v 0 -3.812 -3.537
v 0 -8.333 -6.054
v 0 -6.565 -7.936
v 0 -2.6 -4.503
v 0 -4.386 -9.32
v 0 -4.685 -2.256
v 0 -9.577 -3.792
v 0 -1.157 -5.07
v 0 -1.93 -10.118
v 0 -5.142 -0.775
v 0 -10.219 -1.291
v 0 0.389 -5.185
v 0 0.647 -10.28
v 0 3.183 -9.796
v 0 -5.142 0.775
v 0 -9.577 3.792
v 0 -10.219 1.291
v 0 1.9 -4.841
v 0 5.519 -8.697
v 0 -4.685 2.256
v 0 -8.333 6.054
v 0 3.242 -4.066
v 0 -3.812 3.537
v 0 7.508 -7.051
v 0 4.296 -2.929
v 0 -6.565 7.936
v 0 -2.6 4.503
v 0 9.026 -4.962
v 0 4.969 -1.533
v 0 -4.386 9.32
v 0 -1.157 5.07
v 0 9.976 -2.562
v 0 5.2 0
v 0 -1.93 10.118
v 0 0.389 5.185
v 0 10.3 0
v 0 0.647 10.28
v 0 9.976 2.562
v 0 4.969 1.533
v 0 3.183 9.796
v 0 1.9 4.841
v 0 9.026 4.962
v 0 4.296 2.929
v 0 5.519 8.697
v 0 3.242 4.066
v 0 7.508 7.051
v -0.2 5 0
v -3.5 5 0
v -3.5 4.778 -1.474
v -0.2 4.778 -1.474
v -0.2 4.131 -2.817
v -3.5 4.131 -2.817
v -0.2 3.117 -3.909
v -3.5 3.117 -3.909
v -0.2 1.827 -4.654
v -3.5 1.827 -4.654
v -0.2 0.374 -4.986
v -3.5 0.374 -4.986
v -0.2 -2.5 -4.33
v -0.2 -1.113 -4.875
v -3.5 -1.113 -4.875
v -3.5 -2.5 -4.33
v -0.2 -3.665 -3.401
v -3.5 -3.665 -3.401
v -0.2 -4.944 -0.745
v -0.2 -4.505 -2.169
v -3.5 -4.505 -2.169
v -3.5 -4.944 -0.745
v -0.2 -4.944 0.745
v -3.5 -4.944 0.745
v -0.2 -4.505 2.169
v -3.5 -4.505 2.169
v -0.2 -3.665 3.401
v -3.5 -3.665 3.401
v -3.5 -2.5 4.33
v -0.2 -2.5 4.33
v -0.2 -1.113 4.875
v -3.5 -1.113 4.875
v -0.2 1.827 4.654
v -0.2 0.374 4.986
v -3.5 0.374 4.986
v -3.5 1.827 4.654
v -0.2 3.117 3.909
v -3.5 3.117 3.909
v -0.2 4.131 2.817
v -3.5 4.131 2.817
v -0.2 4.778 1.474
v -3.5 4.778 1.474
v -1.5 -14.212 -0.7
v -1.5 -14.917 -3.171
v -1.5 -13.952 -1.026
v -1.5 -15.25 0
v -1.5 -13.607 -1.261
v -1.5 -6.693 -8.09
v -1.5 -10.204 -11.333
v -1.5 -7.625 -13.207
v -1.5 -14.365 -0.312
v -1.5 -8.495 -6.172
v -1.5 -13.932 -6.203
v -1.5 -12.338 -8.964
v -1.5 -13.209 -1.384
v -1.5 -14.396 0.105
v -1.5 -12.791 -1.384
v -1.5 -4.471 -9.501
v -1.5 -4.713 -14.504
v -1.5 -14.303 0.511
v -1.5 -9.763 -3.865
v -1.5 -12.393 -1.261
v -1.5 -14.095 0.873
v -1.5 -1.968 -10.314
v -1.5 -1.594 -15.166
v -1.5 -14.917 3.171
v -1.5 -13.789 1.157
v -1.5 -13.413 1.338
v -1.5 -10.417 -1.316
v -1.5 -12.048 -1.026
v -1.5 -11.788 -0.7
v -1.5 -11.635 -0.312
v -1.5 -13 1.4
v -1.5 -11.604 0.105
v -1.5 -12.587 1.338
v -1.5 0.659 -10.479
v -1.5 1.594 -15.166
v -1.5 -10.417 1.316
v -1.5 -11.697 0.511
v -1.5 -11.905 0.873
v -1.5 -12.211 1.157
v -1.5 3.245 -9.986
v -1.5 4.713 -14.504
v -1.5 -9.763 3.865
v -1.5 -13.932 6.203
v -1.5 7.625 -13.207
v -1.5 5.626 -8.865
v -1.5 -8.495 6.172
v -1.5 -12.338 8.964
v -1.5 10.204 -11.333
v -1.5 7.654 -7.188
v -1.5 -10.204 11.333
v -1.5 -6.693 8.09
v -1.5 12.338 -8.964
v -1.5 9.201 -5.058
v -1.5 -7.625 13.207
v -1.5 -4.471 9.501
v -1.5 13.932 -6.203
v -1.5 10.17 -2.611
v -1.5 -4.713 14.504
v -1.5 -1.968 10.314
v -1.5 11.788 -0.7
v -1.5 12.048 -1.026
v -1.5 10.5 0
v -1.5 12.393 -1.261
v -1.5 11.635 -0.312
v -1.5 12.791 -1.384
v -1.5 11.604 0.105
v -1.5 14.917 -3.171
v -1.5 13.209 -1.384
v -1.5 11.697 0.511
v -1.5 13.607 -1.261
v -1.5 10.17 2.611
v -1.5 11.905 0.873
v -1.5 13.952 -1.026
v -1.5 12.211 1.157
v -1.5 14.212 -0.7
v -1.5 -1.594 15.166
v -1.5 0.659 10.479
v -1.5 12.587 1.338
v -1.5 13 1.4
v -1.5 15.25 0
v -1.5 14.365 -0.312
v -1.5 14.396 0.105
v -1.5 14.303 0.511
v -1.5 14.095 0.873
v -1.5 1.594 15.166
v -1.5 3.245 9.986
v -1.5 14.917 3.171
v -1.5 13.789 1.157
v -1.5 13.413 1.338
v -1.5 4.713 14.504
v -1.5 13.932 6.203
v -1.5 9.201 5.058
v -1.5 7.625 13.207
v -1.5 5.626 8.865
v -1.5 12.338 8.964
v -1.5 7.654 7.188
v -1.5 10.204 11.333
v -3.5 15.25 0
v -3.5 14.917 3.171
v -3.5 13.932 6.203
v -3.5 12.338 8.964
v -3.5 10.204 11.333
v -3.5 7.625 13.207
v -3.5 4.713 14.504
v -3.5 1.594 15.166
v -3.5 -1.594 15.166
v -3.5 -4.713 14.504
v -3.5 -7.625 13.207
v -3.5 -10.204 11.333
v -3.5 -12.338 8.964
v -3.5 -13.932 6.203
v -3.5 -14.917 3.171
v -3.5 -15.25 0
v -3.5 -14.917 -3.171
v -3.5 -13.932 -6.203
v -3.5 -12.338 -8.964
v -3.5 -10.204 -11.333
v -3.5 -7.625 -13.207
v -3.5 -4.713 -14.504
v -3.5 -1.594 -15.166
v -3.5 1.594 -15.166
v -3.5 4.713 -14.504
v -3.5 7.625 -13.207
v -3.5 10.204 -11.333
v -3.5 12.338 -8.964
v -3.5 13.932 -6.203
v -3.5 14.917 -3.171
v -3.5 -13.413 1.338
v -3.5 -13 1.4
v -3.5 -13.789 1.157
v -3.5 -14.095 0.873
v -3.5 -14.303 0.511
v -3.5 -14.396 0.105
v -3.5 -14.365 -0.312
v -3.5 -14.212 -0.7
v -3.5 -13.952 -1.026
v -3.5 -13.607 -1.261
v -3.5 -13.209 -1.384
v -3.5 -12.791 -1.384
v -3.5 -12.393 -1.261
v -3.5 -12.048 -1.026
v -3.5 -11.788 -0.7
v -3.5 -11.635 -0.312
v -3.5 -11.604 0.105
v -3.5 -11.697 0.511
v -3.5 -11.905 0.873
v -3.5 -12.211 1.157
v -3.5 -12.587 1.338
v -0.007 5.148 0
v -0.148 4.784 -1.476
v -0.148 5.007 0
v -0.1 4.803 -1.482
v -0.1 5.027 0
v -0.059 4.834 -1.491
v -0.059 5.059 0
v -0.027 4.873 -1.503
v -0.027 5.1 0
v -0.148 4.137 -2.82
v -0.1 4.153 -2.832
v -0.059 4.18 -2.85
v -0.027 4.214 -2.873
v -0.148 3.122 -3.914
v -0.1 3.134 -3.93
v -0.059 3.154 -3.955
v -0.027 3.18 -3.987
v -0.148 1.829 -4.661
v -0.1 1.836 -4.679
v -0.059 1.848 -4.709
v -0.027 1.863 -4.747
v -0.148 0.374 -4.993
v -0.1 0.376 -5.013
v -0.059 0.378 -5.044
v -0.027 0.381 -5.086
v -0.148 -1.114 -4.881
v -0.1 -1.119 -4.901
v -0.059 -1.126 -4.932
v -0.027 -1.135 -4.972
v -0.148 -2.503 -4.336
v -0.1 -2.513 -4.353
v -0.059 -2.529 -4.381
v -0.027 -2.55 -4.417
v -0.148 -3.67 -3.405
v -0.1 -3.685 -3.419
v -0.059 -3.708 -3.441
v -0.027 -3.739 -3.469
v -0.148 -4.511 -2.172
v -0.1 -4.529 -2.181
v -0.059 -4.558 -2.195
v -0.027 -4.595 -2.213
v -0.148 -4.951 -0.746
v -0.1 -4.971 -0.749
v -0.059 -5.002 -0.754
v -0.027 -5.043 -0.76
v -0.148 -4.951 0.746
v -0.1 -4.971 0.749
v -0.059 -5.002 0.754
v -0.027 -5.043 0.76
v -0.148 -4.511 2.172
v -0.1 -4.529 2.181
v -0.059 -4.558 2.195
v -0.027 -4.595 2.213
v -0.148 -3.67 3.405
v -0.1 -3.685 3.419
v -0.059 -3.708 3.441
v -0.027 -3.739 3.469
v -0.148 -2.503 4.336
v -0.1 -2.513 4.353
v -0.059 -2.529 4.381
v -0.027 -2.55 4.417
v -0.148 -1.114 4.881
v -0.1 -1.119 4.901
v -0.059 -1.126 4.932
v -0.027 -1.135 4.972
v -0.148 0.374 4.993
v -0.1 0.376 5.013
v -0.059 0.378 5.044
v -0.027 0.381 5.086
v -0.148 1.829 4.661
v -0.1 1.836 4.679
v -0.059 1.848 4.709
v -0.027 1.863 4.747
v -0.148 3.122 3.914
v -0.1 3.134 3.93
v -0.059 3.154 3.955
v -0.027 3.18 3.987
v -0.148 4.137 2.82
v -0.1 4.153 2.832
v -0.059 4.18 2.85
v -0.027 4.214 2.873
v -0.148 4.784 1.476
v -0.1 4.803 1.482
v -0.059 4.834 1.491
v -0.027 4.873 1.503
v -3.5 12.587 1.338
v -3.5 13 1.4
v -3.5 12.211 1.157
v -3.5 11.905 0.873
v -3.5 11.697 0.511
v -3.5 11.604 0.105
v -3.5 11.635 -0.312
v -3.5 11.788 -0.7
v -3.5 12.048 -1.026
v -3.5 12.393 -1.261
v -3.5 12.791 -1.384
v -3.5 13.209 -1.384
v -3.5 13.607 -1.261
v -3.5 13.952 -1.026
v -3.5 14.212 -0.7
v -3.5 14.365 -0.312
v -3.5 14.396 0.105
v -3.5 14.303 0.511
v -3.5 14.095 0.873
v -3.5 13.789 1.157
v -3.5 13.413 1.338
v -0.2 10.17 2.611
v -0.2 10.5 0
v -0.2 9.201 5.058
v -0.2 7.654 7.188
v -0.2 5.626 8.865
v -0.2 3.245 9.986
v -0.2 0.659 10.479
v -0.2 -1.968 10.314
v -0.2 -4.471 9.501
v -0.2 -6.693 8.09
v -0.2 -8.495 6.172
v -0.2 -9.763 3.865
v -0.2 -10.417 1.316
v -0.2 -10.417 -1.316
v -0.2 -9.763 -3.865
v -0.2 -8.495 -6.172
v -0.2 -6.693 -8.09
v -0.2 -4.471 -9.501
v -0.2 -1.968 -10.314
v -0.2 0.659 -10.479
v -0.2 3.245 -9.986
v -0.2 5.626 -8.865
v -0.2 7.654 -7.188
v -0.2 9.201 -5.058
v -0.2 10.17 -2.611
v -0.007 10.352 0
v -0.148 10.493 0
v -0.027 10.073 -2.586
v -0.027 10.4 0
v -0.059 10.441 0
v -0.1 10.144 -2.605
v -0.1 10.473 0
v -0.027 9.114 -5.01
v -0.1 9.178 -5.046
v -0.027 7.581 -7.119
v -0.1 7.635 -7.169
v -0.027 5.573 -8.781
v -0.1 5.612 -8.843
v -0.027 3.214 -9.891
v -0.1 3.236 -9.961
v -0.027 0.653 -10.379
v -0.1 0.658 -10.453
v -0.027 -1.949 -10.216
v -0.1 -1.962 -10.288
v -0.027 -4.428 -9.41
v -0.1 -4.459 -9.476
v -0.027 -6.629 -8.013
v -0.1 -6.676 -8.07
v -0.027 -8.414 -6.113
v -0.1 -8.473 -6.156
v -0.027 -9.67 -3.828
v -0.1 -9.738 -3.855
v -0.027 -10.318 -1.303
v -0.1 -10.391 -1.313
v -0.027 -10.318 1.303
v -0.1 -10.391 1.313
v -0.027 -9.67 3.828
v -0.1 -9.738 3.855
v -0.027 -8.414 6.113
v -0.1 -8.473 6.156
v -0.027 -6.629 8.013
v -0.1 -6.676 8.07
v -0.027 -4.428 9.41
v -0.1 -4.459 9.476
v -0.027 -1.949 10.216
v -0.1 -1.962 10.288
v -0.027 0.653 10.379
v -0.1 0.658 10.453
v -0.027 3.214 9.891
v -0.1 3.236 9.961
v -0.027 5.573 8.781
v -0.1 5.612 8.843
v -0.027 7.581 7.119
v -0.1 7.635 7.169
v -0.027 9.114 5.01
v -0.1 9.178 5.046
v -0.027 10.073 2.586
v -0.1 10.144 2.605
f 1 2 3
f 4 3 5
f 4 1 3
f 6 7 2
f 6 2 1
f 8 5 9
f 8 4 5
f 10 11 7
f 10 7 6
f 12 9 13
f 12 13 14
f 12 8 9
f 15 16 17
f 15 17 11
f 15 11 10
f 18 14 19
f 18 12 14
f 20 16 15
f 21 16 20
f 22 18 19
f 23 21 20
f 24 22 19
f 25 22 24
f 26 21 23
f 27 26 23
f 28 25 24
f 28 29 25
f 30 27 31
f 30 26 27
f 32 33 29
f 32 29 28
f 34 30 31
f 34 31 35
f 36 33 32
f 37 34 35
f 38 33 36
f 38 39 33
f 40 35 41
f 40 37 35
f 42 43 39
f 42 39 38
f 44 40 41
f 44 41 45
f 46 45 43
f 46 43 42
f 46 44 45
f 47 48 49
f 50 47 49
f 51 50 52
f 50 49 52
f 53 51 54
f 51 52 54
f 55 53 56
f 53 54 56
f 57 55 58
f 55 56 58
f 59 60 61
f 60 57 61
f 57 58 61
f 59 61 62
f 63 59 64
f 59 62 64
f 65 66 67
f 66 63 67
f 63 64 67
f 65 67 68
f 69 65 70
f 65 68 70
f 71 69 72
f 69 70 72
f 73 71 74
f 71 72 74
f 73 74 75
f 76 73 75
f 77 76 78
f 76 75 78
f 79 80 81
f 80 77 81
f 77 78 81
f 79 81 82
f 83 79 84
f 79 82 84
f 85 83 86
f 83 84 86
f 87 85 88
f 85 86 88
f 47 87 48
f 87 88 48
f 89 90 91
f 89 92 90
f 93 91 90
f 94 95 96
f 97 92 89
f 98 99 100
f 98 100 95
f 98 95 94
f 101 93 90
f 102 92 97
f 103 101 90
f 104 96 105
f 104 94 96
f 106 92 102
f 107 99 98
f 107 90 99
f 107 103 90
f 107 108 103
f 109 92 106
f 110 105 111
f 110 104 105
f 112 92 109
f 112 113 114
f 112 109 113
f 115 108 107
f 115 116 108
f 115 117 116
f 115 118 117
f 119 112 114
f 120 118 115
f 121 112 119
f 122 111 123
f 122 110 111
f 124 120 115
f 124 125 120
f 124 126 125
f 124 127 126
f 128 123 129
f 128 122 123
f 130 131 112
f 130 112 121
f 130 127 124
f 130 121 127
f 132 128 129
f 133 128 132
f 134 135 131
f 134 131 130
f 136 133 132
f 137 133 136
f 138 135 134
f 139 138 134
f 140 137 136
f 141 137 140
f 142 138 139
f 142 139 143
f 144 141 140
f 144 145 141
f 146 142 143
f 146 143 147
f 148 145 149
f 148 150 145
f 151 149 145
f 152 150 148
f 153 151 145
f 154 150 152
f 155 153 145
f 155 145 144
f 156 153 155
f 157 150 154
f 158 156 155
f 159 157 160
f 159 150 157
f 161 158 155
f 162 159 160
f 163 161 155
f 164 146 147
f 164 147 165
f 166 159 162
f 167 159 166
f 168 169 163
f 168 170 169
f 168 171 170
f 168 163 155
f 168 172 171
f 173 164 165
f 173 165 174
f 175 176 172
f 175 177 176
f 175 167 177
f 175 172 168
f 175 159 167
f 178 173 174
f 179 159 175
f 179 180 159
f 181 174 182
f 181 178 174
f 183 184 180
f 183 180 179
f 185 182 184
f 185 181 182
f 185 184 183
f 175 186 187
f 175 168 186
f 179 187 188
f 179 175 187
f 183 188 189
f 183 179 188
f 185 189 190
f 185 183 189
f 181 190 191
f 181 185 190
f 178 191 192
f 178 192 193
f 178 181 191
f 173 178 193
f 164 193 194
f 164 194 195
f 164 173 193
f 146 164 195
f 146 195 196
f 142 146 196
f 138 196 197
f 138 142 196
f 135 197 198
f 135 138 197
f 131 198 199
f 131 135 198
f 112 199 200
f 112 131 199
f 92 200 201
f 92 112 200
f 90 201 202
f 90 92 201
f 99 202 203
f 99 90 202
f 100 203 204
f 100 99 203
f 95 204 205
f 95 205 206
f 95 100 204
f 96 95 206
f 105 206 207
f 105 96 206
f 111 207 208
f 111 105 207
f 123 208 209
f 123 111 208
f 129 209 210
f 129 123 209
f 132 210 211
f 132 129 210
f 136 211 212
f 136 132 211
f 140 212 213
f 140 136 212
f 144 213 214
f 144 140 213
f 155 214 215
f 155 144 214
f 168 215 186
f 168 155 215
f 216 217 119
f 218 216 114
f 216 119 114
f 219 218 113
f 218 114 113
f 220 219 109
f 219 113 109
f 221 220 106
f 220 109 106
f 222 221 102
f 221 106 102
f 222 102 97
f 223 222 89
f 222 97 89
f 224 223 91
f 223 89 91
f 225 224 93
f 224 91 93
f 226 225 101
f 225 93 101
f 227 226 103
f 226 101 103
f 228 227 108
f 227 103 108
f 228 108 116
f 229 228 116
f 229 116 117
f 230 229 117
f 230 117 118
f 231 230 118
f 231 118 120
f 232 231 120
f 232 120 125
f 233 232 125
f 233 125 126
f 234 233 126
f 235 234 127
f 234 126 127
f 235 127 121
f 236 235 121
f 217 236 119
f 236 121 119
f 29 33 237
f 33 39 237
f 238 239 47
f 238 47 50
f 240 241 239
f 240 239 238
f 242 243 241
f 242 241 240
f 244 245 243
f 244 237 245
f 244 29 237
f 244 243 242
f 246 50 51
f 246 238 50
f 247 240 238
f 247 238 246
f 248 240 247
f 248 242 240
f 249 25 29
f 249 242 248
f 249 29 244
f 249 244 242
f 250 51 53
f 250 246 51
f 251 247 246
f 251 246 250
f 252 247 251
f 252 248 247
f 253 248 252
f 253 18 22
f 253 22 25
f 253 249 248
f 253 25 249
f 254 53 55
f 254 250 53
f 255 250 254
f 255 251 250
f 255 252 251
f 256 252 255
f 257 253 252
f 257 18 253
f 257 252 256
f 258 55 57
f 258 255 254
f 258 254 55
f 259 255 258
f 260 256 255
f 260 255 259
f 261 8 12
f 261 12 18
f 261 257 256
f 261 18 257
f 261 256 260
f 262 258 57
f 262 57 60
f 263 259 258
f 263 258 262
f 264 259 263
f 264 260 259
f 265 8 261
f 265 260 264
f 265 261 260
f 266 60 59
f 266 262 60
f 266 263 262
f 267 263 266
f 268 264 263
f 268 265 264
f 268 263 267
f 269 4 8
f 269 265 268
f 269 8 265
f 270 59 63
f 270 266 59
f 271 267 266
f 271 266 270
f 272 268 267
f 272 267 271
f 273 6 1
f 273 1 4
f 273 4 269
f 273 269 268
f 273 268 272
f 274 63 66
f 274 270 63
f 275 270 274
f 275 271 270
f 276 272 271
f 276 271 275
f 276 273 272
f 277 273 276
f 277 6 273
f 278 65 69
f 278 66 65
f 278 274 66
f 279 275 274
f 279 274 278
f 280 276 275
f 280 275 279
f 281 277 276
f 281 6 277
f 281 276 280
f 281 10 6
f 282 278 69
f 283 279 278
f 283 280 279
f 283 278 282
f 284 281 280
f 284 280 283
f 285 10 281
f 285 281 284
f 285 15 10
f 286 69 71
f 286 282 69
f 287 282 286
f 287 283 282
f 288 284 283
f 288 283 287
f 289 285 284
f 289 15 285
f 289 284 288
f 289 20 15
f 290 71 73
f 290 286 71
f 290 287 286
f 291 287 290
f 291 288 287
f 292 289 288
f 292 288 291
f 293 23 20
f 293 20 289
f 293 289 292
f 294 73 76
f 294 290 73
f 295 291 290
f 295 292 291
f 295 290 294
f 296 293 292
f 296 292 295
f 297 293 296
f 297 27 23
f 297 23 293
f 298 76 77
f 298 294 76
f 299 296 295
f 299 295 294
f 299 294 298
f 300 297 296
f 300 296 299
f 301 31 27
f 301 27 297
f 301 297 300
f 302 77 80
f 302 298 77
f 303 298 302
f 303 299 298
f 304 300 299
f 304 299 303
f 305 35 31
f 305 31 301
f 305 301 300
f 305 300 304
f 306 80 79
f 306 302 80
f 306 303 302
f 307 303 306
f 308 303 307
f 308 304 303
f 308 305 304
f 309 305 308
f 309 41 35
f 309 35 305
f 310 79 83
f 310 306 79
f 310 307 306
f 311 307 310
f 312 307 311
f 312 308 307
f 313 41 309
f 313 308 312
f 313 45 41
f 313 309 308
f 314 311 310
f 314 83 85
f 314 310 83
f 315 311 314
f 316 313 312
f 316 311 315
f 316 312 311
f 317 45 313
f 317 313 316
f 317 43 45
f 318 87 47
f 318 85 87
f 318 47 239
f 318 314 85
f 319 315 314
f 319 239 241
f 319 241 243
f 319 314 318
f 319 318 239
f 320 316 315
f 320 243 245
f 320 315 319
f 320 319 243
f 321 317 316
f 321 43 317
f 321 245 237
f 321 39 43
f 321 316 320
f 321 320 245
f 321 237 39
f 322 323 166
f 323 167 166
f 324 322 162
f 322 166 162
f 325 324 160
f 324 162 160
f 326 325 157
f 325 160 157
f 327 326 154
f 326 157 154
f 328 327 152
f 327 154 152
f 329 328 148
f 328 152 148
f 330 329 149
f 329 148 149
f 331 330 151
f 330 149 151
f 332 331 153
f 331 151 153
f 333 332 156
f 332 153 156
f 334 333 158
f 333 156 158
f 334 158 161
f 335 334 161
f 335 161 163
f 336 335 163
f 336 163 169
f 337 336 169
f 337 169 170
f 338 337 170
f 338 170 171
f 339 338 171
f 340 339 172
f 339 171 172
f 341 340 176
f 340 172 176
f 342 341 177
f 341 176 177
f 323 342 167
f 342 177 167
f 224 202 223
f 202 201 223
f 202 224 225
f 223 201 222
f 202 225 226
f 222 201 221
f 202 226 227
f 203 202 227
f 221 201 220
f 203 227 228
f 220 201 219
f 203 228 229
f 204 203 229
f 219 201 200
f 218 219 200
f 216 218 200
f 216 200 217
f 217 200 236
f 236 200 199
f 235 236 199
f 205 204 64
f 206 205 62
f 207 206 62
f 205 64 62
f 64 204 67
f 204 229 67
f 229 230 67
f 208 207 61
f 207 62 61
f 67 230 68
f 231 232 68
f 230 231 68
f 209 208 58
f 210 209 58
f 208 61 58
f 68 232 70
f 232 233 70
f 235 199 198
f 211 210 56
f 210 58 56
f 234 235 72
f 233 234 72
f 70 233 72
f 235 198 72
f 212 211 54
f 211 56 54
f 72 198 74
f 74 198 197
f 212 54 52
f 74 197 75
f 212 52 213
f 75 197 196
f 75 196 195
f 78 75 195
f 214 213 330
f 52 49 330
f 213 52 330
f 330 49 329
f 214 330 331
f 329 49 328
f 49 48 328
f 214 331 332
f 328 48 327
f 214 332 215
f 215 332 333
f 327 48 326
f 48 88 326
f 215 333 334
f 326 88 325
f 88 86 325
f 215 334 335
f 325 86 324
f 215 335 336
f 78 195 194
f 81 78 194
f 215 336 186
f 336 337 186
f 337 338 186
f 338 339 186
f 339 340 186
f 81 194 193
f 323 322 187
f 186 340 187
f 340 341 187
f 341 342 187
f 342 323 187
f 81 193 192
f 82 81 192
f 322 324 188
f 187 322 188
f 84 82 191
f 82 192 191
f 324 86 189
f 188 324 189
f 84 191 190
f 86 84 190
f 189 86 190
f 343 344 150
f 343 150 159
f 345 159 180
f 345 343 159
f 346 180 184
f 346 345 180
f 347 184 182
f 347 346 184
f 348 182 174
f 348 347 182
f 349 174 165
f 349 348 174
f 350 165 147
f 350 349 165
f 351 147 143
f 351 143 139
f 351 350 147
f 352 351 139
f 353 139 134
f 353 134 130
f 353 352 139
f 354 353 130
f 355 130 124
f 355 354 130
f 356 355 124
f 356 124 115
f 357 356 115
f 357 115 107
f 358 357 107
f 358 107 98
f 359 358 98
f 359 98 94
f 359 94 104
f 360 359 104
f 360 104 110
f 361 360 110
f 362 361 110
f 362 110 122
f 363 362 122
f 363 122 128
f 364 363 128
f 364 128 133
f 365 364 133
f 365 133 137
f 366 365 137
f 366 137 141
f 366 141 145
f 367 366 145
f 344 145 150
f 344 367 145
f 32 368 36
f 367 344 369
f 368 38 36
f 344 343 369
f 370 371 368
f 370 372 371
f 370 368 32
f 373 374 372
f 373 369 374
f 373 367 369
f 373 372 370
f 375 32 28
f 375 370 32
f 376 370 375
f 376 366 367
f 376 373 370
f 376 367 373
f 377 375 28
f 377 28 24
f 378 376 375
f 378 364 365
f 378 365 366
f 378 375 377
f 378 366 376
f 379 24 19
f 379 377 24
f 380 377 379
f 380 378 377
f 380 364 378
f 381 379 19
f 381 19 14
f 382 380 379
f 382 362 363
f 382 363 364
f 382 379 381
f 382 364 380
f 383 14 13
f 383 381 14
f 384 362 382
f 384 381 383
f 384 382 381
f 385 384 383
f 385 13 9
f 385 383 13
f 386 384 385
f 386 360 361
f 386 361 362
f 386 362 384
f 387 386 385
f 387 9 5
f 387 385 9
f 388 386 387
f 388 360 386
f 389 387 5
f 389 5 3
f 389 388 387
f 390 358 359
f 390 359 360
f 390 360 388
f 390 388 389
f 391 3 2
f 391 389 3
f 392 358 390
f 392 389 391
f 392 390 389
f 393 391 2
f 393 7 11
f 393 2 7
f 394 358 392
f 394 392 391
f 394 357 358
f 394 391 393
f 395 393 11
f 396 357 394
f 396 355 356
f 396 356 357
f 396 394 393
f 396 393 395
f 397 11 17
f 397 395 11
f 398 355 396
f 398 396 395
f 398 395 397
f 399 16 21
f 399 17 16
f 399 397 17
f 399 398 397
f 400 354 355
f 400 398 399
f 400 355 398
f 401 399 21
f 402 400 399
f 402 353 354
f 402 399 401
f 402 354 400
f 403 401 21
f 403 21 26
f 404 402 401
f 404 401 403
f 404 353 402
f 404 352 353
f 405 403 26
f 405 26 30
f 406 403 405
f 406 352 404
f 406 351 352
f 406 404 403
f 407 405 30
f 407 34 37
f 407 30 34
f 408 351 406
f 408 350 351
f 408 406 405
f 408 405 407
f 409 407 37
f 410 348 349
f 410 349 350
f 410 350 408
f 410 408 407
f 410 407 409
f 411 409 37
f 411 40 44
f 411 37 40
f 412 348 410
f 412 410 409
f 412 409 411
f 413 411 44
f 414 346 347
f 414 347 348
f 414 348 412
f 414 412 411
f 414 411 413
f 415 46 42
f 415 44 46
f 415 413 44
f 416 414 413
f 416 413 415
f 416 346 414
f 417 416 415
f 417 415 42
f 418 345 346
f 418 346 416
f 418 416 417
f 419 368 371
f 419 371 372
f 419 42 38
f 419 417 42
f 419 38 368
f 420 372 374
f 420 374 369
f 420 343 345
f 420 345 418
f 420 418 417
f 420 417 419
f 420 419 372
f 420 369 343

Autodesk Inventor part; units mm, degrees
ref_plane "YZ Plane" through (0, 0, 0) normal (1, 0, 0) x (0, 1, 0)
ref_plane "XZ Plane" through (0, 0, 0) normal (0, 1, 0) x (-1, 0, 0)
ref_plane "XY Plane" through (0, 0, 0) normal (0, 0, 1) x (1, 0, 0)
sketch "Sketch1" plane through (0, 0, 0) normal (0, 0, 1) x (1, 0, 0)
  line L0 (-4.2, 0) -> (0.7, 0) construction
  line L1 (0, -3.05) -> (0, 18.3) construction
  line L2 (0, 5) -> (-3.5, 5)
  line L3 (-3.5, 5) -> (-3.5, 15.25)
  line L4 (-3.5, 15.25) -> (-1.5, 15.25)
  line L5 (-1.5, 15.25) -> (-1.5, 10.5)
  line L6 (-1.5, 10.5) -> (0, 10.5)
  line L7 (0, 10.5) -> (0, 5)
  point P0 (0, 0)
  dimension "d0" = 10
  dimension "d1" = 21
  dimension "d2" = 1.5
  dimension "d3" = 2
  dimension "d4" = 30.5
revolve "Revolution1" add sketch "Sketch1" angle 360 about axis through (-10, 0, 0) along (1, 0, 0)
sketch "Sketch2" plane through (-3.5, 0, 0) normal (-1, 0, 0) x (0, 0, 1)
  line L0 (0, -21.35) -> (0, 21.35) projected
  line L1 (-21.35, 0) -> (21.35, 0) projected
  point P0 (0, 0)
  point P1 (0, 13)
  dimension "d6" = 13
hole "Hole1" at (-3.5, 13, 0) direction (1, 0, 0) diameter 2.8 end through all
mirror "Mirror1" about plane through (0, 0, 0) normal (0, 1, 0) of "Hole1"
fillet "Fillet1" radius 0.2 2 edges at (0, -10.5, 0) (0, -5, 0)
properties part number "P120RondelleAppui" material "ABS Plastic"
